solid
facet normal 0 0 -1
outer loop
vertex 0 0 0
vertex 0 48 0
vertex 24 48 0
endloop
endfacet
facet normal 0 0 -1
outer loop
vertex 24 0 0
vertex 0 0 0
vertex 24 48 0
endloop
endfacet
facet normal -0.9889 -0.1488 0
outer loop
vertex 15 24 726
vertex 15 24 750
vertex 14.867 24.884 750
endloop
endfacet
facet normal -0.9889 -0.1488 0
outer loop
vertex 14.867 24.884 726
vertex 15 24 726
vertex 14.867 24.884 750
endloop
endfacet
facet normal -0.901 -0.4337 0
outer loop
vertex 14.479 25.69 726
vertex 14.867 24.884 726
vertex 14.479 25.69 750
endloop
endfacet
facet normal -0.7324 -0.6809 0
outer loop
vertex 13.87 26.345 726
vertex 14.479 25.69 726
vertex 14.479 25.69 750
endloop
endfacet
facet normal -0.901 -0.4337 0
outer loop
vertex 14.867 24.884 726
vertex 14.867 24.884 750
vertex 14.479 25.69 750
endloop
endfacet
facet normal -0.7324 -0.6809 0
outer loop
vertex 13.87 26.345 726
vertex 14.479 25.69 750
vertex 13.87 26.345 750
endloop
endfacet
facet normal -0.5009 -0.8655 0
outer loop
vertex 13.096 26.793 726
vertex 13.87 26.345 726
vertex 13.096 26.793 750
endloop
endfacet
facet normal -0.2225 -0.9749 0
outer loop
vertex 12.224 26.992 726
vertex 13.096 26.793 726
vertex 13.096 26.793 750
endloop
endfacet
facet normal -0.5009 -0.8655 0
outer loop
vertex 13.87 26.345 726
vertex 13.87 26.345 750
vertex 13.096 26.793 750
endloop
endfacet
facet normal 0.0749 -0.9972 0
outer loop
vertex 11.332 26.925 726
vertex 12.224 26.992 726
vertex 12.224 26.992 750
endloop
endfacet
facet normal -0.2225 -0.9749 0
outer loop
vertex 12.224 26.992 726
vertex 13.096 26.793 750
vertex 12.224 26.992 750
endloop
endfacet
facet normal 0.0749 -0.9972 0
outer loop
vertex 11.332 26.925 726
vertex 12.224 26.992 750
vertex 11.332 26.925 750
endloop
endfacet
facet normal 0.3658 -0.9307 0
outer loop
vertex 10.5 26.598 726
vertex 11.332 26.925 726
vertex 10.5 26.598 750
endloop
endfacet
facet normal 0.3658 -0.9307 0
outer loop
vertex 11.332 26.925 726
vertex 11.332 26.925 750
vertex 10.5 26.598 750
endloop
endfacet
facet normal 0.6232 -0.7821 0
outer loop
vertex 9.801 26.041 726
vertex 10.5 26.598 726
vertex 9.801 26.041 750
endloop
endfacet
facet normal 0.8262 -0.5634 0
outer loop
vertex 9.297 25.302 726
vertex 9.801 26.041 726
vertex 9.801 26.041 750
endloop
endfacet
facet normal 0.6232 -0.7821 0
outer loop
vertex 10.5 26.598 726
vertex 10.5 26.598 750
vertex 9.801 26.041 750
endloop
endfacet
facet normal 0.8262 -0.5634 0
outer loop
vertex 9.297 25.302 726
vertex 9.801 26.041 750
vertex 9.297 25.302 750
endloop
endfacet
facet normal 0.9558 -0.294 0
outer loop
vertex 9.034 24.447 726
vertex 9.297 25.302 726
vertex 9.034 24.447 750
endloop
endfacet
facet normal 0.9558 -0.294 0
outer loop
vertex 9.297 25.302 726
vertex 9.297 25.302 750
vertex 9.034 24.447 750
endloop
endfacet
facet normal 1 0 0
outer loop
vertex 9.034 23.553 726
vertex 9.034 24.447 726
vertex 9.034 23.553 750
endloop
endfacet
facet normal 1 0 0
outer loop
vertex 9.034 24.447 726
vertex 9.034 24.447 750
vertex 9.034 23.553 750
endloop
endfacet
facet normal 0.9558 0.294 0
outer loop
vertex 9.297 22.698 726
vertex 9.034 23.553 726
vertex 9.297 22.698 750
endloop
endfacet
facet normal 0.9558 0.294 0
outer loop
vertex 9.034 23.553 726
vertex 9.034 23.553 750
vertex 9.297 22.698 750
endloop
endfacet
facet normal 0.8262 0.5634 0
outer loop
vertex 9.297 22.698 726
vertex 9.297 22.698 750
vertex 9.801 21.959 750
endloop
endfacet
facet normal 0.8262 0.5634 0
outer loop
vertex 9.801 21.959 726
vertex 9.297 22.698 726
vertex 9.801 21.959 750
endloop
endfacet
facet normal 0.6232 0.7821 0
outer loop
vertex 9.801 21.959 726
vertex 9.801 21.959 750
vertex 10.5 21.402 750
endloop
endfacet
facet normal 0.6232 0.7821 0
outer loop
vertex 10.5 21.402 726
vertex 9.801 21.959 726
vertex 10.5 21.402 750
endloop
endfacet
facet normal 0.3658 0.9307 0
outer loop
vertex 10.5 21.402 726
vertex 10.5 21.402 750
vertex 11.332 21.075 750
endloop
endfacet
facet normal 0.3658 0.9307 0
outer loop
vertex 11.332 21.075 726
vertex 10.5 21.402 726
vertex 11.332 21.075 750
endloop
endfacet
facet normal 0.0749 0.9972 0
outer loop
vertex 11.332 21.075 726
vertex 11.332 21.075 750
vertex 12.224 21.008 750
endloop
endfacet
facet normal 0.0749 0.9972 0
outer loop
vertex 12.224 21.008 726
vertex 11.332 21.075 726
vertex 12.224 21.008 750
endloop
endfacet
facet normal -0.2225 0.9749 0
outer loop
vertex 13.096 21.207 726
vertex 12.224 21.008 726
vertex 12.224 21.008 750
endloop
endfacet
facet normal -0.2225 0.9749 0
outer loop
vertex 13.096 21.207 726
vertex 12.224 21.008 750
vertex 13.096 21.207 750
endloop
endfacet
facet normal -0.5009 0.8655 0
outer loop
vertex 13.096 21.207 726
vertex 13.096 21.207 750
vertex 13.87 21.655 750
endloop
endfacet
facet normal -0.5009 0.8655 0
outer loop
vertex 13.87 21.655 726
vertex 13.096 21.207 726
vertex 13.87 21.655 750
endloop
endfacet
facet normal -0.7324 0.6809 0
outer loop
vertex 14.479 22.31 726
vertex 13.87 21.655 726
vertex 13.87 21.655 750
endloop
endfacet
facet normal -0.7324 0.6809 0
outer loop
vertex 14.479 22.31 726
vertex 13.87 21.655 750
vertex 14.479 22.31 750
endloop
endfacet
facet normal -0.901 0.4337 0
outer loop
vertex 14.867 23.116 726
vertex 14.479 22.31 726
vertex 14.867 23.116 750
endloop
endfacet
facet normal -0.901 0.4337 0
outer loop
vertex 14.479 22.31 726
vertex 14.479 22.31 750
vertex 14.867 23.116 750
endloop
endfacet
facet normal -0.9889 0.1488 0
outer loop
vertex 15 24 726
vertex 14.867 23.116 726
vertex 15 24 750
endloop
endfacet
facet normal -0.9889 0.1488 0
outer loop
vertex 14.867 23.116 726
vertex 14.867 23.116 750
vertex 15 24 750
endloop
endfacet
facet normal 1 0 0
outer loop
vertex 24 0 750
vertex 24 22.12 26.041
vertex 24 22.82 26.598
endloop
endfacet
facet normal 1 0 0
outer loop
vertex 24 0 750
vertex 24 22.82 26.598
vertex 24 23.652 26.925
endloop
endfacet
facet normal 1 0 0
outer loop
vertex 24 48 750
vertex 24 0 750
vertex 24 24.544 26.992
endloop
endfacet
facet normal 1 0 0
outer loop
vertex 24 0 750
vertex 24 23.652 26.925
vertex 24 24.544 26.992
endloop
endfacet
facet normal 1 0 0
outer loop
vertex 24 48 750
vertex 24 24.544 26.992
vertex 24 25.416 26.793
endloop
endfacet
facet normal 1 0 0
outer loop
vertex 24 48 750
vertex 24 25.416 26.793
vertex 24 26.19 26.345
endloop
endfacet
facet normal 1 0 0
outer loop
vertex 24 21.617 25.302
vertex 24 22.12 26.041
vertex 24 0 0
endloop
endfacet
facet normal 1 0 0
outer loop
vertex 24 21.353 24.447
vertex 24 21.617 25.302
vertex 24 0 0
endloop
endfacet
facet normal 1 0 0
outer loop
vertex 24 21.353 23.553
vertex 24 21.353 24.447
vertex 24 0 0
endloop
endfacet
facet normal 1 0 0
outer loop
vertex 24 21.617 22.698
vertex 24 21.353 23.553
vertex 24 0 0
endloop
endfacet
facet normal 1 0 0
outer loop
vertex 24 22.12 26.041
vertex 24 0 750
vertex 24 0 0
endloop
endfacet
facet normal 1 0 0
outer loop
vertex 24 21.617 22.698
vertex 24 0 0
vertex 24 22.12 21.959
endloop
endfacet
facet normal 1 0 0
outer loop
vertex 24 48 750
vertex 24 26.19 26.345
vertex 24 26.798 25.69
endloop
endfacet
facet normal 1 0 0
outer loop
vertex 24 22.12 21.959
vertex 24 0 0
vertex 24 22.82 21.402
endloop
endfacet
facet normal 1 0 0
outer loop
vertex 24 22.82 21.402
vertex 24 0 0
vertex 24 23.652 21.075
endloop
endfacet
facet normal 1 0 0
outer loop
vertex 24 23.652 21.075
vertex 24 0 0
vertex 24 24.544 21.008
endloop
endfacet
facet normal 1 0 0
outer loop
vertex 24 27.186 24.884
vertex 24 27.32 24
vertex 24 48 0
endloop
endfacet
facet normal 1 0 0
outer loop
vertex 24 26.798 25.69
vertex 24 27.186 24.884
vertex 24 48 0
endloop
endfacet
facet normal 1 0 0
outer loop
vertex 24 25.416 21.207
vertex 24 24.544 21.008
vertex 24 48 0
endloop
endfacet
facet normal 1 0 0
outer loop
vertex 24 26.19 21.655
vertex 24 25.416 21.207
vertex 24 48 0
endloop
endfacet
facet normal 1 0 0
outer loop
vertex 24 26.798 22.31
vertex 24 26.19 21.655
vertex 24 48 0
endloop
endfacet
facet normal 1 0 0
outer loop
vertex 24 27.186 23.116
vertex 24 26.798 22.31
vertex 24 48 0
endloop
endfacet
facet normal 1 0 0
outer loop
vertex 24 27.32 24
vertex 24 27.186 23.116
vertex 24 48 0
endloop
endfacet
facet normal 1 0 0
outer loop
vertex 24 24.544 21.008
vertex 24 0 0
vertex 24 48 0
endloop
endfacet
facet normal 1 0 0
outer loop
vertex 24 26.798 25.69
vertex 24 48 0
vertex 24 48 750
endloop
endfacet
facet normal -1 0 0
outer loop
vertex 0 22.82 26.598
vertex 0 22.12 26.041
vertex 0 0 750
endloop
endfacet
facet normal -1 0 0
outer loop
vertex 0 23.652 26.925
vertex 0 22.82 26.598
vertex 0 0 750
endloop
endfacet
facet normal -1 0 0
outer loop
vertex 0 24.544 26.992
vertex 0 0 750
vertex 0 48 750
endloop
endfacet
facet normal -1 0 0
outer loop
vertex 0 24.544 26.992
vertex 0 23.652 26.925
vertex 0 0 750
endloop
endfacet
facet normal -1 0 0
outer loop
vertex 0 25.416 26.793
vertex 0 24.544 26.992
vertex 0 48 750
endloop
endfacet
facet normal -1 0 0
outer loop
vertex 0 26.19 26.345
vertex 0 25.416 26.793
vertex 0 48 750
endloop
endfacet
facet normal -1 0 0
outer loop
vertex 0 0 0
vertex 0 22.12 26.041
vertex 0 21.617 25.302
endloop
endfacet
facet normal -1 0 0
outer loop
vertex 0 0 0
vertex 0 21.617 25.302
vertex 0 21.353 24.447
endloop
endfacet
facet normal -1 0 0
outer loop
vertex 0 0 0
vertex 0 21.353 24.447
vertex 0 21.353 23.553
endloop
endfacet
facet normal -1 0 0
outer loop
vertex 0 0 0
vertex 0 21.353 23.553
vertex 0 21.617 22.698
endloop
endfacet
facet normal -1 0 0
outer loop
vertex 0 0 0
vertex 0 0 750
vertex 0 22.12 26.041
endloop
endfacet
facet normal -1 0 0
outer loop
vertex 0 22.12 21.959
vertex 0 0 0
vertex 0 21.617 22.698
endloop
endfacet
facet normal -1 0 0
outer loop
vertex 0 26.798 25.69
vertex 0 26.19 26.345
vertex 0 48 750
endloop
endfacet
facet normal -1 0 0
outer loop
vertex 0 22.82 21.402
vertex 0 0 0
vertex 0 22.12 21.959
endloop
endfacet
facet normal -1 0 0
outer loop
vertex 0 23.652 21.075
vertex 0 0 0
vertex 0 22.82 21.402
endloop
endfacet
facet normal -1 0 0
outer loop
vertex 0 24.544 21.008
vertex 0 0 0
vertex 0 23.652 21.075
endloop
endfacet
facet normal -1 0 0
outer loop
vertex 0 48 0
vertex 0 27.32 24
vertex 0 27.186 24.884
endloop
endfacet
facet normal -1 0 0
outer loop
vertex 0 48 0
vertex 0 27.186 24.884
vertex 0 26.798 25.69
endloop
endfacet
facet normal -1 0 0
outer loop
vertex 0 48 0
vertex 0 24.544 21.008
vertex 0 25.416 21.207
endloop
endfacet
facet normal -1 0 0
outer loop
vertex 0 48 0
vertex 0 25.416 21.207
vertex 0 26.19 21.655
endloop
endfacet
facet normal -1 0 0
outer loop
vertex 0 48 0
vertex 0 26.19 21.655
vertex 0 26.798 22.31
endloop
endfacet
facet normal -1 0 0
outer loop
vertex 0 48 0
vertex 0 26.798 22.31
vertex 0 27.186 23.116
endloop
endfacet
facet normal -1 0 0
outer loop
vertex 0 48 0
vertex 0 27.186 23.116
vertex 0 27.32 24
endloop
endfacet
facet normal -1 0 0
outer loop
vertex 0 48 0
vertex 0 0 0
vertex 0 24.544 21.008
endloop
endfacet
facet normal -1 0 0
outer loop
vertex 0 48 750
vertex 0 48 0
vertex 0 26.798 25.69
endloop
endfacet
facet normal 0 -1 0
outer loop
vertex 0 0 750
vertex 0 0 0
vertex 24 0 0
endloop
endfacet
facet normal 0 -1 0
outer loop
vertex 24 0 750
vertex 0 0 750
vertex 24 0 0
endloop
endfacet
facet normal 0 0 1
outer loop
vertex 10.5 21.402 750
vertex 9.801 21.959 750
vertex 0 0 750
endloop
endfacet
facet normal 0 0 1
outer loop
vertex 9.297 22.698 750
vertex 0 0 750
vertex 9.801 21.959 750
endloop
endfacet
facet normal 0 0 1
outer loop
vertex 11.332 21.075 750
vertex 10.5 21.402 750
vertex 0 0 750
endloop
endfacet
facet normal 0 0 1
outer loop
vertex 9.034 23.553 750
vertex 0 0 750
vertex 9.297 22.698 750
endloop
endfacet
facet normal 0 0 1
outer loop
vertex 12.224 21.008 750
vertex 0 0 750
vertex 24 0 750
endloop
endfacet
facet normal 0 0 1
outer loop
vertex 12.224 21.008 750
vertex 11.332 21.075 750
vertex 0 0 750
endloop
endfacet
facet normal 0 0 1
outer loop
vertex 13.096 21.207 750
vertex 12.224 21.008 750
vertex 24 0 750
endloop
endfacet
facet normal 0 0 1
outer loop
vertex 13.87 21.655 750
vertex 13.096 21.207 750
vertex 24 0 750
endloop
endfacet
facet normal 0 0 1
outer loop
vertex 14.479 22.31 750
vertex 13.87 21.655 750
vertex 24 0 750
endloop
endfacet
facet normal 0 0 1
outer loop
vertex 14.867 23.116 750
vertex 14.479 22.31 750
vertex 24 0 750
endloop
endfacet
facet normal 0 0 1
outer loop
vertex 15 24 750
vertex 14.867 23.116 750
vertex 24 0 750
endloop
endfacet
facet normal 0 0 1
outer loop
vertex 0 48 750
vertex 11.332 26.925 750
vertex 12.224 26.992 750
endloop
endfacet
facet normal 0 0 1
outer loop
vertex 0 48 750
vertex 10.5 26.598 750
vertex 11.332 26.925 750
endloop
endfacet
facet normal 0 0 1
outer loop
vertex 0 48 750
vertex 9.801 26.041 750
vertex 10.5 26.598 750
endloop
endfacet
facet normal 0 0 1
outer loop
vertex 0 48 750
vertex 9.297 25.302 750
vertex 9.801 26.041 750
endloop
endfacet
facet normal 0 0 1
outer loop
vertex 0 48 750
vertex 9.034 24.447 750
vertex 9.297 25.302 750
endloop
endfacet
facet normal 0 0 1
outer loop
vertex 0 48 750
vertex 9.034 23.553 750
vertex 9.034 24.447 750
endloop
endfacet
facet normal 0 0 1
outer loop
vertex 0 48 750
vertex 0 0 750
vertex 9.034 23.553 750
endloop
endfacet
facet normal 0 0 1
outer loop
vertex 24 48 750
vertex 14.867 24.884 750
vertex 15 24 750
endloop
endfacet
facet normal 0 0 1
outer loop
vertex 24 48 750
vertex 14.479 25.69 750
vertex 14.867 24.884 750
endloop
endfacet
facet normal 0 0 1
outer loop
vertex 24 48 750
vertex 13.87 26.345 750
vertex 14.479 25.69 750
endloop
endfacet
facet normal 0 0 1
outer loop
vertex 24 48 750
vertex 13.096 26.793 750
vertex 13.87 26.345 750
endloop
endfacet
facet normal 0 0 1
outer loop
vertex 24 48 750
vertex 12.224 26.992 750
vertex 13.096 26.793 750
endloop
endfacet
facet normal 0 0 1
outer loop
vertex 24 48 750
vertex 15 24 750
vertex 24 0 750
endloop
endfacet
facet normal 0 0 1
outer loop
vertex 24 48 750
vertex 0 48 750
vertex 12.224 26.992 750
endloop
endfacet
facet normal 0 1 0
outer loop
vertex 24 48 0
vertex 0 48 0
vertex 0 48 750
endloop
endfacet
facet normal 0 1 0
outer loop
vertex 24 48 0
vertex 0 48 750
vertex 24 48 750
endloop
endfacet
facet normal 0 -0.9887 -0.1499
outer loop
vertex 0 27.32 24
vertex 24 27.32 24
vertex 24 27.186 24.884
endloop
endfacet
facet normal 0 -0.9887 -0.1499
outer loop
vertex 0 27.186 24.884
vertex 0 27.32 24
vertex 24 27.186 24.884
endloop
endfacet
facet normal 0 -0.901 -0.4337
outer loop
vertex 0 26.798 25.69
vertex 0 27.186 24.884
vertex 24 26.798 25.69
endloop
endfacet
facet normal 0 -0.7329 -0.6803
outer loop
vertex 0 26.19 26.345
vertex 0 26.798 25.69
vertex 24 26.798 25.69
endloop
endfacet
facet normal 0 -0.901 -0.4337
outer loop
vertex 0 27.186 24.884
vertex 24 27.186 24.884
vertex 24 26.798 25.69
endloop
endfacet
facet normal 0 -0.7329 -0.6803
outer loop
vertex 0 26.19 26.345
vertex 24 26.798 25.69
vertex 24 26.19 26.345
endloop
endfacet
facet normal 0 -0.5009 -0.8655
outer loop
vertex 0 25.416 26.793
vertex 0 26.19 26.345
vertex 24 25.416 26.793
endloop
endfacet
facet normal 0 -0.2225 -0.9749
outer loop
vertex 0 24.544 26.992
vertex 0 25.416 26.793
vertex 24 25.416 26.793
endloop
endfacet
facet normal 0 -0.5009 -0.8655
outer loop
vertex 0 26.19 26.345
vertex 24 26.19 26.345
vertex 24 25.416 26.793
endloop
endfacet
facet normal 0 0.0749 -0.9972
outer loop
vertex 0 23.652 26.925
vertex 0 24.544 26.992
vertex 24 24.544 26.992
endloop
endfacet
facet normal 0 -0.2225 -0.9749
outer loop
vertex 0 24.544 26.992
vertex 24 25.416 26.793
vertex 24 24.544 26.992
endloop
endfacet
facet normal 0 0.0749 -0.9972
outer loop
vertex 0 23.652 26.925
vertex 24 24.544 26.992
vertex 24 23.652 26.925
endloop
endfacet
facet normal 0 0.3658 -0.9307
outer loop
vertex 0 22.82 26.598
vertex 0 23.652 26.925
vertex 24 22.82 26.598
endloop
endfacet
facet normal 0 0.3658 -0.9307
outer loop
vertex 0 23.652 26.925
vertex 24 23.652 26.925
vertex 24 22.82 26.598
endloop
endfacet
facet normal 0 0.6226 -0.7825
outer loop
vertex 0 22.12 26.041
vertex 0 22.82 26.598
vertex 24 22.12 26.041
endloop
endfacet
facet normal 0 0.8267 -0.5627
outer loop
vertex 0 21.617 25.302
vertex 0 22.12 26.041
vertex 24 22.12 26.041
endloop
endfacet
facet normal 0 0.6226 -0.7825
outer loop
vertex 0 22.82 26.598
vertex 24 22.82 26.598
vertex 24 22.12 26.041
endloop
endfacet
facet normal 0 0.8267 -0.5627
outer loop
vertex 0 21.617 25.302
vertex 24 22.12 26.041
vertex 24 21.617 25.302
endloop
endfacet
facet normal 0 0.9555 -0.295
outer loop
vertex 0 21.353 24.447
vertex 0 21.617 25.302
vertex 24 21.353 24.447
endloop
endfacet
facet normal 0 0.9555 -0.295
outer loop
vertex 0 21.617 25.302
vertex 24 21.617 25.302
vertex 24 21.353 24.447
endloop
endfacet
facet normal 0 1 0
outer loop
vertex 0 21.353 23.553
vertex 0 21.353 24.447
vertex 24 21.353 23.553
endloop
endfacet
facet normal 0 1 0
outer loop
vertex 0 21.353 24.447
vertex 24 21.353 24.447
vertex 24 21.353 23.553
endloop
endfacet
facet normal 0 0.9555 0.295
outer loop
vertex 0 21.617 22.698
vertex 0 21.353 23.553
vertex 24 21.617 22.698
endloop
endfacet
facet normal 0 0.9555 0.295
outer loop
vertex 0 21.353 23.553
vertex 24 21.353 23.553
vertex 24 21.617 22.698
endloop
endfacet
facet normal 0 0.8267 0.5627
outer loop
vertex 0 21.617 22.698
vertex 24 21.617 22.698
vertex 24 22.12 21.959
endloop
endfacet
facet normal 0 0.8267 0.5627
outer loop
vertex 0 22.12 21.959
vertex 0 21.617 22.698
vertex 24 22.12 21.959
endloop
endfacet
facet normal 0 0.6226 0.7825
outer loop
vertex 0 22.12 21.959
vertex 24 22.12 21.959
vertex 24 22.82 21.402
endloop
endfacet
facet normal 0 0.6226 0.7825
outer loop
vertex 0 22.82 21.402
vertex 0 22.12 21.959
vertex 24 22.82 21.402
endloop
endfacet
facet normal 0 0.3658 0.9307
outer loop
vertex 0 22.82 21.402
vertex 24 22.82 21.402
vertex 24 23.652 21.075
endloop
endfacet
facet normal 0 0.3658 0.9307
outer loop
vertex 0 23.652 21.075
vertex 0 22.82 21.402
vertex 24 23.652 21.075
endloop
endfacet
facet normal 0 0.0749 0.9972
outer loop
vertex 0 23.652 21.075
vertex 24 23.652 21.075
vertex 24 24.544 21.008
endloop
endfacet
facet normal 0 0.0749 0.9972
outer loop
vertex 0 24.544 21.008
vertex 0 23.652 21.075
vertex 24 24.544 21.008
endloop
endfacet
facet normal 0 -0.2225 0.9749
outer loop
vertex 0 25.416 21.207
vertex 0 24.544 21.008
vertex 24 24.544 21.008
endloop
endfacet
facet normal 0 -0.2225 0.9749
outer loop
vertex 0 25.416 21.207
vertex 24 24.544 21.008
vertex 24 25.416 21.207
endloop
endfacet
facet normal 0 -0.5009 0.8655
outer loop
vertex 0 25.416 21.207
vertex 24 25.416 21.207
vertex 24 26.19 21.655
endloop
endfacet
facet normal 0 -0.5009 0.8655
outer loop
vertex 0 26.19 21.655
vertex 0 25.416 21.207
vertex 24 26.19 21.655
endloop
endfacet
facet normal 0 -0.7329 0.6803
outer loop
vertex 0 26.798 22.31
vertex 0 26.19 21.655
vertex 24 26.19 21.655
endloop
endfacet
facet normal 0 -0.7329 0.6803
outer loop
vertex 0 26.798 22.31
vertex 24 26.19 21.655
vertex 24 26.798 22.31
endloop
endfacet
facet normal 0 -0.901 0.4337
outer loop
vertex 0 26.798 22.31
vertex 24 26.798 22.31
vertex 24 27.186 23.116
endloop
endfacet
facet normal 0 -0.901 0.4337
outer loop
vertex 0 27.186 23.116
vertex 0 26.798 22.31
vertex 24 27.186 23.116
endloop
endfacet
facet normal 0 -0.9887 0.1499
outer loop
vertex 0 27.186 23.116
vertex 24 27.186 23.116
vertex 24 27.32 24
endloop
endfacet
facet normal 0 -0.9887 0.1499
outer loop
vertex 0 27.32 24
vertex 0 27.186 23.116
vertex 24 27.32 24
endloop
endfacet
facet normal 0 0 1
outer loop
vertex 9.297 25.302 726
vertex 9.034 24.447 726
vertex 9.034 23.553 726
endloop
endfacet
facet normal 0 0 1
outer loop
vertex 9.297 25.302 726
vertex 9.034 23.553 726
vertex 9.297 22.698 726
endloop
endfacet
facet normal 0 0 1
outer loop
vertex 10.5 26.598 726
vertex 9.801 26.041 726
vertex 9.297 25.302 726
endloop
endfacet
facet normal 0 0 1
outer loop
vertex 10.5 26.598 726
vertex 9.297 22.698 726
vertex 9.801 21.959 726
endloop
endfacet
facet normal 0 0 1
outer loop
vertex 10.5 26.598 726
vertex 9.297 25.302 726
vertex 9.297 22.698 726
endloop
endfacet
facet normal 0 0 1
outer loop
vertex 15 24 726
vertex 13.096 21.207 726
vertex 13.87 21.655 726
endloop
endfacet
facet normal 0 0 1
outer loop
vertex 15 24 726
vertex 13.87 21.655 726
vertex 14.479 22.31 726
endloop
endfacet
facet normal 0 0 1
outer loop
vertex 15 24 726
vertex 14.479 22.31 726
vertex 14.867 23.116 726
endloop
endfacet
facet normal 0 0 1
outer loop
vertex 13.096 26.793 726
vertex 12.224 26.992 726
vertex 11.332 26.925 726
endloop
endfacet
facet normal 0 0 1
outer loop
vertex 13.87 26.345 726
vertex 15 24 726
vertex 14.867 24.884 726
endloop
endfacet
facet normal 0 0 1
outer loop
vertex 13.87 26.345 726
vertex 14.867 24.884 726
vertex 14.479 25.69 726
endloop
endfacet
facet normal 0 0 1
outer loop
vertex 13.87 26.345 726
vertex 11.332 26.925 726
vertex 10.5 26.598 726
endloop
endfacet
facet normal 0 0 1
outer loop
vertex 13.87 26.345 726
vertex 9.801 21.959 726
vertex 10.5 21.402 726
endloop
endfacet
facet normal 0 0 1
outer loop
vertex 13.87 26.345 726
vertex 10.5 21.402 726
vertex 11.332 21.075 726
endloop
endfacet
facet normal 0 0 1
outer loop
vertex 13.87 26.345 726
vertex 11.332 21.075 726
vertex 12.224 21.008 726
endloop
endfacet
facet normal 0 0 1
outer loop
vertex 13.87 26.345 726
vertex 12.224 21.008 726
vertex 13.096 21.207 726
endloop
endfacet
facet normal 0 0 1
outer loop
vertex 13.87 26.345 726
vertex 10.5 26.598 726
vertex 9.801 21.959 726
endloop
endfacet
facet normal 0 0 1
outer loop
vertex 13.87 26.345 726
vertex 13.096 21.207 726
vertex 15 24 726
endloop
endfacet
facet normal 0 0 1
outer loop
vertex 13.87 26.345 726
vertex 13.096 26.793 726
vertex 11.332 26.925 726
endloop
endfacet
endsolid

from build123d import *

# Parameters (mm, degrees)
SKETCH088_W     = 24
SKETCH088_H     = 48
PAD049_DEPTH    = 750
SKETCH089_R     = 3
POCKET039_DEPTH = 24.001
SKETCH090_R     = 3
POCKET040_DEPTH = 24


with BuildPart() as part:
    # Sketch088 → Pad049 (new body)
    with BuildSketch(Plane.XY):
        with Locations((12, 24)):
            Rectangle(SKETCH088_W, SKETCH088_H)
    extrude(amount=PAD049_DEPTH)

    # Sketch089 (on Face2 of Pad049) → Pocket039 (cut, through all)
    with BuildSketch(Plane.YZ.offset(24)):
        with Locations((24.319635, 24)):
            Circle(SKETCH089_R)
    extrude(amount=-POCKET039_DEPTH, mode=Mode.SUBTRACT)

    # Sketch090 (on Face5 of Pocket039) → Pocket040 (cut)
    with BuildSketch(Plane.XY.offset(750)):
        with Locations((12, 24)):
            Circle(SKETCH090_R)
    extrude(amount=-POCKET040_DEPTH, mode=Mode.SUBTRACT)


solid = part.part
